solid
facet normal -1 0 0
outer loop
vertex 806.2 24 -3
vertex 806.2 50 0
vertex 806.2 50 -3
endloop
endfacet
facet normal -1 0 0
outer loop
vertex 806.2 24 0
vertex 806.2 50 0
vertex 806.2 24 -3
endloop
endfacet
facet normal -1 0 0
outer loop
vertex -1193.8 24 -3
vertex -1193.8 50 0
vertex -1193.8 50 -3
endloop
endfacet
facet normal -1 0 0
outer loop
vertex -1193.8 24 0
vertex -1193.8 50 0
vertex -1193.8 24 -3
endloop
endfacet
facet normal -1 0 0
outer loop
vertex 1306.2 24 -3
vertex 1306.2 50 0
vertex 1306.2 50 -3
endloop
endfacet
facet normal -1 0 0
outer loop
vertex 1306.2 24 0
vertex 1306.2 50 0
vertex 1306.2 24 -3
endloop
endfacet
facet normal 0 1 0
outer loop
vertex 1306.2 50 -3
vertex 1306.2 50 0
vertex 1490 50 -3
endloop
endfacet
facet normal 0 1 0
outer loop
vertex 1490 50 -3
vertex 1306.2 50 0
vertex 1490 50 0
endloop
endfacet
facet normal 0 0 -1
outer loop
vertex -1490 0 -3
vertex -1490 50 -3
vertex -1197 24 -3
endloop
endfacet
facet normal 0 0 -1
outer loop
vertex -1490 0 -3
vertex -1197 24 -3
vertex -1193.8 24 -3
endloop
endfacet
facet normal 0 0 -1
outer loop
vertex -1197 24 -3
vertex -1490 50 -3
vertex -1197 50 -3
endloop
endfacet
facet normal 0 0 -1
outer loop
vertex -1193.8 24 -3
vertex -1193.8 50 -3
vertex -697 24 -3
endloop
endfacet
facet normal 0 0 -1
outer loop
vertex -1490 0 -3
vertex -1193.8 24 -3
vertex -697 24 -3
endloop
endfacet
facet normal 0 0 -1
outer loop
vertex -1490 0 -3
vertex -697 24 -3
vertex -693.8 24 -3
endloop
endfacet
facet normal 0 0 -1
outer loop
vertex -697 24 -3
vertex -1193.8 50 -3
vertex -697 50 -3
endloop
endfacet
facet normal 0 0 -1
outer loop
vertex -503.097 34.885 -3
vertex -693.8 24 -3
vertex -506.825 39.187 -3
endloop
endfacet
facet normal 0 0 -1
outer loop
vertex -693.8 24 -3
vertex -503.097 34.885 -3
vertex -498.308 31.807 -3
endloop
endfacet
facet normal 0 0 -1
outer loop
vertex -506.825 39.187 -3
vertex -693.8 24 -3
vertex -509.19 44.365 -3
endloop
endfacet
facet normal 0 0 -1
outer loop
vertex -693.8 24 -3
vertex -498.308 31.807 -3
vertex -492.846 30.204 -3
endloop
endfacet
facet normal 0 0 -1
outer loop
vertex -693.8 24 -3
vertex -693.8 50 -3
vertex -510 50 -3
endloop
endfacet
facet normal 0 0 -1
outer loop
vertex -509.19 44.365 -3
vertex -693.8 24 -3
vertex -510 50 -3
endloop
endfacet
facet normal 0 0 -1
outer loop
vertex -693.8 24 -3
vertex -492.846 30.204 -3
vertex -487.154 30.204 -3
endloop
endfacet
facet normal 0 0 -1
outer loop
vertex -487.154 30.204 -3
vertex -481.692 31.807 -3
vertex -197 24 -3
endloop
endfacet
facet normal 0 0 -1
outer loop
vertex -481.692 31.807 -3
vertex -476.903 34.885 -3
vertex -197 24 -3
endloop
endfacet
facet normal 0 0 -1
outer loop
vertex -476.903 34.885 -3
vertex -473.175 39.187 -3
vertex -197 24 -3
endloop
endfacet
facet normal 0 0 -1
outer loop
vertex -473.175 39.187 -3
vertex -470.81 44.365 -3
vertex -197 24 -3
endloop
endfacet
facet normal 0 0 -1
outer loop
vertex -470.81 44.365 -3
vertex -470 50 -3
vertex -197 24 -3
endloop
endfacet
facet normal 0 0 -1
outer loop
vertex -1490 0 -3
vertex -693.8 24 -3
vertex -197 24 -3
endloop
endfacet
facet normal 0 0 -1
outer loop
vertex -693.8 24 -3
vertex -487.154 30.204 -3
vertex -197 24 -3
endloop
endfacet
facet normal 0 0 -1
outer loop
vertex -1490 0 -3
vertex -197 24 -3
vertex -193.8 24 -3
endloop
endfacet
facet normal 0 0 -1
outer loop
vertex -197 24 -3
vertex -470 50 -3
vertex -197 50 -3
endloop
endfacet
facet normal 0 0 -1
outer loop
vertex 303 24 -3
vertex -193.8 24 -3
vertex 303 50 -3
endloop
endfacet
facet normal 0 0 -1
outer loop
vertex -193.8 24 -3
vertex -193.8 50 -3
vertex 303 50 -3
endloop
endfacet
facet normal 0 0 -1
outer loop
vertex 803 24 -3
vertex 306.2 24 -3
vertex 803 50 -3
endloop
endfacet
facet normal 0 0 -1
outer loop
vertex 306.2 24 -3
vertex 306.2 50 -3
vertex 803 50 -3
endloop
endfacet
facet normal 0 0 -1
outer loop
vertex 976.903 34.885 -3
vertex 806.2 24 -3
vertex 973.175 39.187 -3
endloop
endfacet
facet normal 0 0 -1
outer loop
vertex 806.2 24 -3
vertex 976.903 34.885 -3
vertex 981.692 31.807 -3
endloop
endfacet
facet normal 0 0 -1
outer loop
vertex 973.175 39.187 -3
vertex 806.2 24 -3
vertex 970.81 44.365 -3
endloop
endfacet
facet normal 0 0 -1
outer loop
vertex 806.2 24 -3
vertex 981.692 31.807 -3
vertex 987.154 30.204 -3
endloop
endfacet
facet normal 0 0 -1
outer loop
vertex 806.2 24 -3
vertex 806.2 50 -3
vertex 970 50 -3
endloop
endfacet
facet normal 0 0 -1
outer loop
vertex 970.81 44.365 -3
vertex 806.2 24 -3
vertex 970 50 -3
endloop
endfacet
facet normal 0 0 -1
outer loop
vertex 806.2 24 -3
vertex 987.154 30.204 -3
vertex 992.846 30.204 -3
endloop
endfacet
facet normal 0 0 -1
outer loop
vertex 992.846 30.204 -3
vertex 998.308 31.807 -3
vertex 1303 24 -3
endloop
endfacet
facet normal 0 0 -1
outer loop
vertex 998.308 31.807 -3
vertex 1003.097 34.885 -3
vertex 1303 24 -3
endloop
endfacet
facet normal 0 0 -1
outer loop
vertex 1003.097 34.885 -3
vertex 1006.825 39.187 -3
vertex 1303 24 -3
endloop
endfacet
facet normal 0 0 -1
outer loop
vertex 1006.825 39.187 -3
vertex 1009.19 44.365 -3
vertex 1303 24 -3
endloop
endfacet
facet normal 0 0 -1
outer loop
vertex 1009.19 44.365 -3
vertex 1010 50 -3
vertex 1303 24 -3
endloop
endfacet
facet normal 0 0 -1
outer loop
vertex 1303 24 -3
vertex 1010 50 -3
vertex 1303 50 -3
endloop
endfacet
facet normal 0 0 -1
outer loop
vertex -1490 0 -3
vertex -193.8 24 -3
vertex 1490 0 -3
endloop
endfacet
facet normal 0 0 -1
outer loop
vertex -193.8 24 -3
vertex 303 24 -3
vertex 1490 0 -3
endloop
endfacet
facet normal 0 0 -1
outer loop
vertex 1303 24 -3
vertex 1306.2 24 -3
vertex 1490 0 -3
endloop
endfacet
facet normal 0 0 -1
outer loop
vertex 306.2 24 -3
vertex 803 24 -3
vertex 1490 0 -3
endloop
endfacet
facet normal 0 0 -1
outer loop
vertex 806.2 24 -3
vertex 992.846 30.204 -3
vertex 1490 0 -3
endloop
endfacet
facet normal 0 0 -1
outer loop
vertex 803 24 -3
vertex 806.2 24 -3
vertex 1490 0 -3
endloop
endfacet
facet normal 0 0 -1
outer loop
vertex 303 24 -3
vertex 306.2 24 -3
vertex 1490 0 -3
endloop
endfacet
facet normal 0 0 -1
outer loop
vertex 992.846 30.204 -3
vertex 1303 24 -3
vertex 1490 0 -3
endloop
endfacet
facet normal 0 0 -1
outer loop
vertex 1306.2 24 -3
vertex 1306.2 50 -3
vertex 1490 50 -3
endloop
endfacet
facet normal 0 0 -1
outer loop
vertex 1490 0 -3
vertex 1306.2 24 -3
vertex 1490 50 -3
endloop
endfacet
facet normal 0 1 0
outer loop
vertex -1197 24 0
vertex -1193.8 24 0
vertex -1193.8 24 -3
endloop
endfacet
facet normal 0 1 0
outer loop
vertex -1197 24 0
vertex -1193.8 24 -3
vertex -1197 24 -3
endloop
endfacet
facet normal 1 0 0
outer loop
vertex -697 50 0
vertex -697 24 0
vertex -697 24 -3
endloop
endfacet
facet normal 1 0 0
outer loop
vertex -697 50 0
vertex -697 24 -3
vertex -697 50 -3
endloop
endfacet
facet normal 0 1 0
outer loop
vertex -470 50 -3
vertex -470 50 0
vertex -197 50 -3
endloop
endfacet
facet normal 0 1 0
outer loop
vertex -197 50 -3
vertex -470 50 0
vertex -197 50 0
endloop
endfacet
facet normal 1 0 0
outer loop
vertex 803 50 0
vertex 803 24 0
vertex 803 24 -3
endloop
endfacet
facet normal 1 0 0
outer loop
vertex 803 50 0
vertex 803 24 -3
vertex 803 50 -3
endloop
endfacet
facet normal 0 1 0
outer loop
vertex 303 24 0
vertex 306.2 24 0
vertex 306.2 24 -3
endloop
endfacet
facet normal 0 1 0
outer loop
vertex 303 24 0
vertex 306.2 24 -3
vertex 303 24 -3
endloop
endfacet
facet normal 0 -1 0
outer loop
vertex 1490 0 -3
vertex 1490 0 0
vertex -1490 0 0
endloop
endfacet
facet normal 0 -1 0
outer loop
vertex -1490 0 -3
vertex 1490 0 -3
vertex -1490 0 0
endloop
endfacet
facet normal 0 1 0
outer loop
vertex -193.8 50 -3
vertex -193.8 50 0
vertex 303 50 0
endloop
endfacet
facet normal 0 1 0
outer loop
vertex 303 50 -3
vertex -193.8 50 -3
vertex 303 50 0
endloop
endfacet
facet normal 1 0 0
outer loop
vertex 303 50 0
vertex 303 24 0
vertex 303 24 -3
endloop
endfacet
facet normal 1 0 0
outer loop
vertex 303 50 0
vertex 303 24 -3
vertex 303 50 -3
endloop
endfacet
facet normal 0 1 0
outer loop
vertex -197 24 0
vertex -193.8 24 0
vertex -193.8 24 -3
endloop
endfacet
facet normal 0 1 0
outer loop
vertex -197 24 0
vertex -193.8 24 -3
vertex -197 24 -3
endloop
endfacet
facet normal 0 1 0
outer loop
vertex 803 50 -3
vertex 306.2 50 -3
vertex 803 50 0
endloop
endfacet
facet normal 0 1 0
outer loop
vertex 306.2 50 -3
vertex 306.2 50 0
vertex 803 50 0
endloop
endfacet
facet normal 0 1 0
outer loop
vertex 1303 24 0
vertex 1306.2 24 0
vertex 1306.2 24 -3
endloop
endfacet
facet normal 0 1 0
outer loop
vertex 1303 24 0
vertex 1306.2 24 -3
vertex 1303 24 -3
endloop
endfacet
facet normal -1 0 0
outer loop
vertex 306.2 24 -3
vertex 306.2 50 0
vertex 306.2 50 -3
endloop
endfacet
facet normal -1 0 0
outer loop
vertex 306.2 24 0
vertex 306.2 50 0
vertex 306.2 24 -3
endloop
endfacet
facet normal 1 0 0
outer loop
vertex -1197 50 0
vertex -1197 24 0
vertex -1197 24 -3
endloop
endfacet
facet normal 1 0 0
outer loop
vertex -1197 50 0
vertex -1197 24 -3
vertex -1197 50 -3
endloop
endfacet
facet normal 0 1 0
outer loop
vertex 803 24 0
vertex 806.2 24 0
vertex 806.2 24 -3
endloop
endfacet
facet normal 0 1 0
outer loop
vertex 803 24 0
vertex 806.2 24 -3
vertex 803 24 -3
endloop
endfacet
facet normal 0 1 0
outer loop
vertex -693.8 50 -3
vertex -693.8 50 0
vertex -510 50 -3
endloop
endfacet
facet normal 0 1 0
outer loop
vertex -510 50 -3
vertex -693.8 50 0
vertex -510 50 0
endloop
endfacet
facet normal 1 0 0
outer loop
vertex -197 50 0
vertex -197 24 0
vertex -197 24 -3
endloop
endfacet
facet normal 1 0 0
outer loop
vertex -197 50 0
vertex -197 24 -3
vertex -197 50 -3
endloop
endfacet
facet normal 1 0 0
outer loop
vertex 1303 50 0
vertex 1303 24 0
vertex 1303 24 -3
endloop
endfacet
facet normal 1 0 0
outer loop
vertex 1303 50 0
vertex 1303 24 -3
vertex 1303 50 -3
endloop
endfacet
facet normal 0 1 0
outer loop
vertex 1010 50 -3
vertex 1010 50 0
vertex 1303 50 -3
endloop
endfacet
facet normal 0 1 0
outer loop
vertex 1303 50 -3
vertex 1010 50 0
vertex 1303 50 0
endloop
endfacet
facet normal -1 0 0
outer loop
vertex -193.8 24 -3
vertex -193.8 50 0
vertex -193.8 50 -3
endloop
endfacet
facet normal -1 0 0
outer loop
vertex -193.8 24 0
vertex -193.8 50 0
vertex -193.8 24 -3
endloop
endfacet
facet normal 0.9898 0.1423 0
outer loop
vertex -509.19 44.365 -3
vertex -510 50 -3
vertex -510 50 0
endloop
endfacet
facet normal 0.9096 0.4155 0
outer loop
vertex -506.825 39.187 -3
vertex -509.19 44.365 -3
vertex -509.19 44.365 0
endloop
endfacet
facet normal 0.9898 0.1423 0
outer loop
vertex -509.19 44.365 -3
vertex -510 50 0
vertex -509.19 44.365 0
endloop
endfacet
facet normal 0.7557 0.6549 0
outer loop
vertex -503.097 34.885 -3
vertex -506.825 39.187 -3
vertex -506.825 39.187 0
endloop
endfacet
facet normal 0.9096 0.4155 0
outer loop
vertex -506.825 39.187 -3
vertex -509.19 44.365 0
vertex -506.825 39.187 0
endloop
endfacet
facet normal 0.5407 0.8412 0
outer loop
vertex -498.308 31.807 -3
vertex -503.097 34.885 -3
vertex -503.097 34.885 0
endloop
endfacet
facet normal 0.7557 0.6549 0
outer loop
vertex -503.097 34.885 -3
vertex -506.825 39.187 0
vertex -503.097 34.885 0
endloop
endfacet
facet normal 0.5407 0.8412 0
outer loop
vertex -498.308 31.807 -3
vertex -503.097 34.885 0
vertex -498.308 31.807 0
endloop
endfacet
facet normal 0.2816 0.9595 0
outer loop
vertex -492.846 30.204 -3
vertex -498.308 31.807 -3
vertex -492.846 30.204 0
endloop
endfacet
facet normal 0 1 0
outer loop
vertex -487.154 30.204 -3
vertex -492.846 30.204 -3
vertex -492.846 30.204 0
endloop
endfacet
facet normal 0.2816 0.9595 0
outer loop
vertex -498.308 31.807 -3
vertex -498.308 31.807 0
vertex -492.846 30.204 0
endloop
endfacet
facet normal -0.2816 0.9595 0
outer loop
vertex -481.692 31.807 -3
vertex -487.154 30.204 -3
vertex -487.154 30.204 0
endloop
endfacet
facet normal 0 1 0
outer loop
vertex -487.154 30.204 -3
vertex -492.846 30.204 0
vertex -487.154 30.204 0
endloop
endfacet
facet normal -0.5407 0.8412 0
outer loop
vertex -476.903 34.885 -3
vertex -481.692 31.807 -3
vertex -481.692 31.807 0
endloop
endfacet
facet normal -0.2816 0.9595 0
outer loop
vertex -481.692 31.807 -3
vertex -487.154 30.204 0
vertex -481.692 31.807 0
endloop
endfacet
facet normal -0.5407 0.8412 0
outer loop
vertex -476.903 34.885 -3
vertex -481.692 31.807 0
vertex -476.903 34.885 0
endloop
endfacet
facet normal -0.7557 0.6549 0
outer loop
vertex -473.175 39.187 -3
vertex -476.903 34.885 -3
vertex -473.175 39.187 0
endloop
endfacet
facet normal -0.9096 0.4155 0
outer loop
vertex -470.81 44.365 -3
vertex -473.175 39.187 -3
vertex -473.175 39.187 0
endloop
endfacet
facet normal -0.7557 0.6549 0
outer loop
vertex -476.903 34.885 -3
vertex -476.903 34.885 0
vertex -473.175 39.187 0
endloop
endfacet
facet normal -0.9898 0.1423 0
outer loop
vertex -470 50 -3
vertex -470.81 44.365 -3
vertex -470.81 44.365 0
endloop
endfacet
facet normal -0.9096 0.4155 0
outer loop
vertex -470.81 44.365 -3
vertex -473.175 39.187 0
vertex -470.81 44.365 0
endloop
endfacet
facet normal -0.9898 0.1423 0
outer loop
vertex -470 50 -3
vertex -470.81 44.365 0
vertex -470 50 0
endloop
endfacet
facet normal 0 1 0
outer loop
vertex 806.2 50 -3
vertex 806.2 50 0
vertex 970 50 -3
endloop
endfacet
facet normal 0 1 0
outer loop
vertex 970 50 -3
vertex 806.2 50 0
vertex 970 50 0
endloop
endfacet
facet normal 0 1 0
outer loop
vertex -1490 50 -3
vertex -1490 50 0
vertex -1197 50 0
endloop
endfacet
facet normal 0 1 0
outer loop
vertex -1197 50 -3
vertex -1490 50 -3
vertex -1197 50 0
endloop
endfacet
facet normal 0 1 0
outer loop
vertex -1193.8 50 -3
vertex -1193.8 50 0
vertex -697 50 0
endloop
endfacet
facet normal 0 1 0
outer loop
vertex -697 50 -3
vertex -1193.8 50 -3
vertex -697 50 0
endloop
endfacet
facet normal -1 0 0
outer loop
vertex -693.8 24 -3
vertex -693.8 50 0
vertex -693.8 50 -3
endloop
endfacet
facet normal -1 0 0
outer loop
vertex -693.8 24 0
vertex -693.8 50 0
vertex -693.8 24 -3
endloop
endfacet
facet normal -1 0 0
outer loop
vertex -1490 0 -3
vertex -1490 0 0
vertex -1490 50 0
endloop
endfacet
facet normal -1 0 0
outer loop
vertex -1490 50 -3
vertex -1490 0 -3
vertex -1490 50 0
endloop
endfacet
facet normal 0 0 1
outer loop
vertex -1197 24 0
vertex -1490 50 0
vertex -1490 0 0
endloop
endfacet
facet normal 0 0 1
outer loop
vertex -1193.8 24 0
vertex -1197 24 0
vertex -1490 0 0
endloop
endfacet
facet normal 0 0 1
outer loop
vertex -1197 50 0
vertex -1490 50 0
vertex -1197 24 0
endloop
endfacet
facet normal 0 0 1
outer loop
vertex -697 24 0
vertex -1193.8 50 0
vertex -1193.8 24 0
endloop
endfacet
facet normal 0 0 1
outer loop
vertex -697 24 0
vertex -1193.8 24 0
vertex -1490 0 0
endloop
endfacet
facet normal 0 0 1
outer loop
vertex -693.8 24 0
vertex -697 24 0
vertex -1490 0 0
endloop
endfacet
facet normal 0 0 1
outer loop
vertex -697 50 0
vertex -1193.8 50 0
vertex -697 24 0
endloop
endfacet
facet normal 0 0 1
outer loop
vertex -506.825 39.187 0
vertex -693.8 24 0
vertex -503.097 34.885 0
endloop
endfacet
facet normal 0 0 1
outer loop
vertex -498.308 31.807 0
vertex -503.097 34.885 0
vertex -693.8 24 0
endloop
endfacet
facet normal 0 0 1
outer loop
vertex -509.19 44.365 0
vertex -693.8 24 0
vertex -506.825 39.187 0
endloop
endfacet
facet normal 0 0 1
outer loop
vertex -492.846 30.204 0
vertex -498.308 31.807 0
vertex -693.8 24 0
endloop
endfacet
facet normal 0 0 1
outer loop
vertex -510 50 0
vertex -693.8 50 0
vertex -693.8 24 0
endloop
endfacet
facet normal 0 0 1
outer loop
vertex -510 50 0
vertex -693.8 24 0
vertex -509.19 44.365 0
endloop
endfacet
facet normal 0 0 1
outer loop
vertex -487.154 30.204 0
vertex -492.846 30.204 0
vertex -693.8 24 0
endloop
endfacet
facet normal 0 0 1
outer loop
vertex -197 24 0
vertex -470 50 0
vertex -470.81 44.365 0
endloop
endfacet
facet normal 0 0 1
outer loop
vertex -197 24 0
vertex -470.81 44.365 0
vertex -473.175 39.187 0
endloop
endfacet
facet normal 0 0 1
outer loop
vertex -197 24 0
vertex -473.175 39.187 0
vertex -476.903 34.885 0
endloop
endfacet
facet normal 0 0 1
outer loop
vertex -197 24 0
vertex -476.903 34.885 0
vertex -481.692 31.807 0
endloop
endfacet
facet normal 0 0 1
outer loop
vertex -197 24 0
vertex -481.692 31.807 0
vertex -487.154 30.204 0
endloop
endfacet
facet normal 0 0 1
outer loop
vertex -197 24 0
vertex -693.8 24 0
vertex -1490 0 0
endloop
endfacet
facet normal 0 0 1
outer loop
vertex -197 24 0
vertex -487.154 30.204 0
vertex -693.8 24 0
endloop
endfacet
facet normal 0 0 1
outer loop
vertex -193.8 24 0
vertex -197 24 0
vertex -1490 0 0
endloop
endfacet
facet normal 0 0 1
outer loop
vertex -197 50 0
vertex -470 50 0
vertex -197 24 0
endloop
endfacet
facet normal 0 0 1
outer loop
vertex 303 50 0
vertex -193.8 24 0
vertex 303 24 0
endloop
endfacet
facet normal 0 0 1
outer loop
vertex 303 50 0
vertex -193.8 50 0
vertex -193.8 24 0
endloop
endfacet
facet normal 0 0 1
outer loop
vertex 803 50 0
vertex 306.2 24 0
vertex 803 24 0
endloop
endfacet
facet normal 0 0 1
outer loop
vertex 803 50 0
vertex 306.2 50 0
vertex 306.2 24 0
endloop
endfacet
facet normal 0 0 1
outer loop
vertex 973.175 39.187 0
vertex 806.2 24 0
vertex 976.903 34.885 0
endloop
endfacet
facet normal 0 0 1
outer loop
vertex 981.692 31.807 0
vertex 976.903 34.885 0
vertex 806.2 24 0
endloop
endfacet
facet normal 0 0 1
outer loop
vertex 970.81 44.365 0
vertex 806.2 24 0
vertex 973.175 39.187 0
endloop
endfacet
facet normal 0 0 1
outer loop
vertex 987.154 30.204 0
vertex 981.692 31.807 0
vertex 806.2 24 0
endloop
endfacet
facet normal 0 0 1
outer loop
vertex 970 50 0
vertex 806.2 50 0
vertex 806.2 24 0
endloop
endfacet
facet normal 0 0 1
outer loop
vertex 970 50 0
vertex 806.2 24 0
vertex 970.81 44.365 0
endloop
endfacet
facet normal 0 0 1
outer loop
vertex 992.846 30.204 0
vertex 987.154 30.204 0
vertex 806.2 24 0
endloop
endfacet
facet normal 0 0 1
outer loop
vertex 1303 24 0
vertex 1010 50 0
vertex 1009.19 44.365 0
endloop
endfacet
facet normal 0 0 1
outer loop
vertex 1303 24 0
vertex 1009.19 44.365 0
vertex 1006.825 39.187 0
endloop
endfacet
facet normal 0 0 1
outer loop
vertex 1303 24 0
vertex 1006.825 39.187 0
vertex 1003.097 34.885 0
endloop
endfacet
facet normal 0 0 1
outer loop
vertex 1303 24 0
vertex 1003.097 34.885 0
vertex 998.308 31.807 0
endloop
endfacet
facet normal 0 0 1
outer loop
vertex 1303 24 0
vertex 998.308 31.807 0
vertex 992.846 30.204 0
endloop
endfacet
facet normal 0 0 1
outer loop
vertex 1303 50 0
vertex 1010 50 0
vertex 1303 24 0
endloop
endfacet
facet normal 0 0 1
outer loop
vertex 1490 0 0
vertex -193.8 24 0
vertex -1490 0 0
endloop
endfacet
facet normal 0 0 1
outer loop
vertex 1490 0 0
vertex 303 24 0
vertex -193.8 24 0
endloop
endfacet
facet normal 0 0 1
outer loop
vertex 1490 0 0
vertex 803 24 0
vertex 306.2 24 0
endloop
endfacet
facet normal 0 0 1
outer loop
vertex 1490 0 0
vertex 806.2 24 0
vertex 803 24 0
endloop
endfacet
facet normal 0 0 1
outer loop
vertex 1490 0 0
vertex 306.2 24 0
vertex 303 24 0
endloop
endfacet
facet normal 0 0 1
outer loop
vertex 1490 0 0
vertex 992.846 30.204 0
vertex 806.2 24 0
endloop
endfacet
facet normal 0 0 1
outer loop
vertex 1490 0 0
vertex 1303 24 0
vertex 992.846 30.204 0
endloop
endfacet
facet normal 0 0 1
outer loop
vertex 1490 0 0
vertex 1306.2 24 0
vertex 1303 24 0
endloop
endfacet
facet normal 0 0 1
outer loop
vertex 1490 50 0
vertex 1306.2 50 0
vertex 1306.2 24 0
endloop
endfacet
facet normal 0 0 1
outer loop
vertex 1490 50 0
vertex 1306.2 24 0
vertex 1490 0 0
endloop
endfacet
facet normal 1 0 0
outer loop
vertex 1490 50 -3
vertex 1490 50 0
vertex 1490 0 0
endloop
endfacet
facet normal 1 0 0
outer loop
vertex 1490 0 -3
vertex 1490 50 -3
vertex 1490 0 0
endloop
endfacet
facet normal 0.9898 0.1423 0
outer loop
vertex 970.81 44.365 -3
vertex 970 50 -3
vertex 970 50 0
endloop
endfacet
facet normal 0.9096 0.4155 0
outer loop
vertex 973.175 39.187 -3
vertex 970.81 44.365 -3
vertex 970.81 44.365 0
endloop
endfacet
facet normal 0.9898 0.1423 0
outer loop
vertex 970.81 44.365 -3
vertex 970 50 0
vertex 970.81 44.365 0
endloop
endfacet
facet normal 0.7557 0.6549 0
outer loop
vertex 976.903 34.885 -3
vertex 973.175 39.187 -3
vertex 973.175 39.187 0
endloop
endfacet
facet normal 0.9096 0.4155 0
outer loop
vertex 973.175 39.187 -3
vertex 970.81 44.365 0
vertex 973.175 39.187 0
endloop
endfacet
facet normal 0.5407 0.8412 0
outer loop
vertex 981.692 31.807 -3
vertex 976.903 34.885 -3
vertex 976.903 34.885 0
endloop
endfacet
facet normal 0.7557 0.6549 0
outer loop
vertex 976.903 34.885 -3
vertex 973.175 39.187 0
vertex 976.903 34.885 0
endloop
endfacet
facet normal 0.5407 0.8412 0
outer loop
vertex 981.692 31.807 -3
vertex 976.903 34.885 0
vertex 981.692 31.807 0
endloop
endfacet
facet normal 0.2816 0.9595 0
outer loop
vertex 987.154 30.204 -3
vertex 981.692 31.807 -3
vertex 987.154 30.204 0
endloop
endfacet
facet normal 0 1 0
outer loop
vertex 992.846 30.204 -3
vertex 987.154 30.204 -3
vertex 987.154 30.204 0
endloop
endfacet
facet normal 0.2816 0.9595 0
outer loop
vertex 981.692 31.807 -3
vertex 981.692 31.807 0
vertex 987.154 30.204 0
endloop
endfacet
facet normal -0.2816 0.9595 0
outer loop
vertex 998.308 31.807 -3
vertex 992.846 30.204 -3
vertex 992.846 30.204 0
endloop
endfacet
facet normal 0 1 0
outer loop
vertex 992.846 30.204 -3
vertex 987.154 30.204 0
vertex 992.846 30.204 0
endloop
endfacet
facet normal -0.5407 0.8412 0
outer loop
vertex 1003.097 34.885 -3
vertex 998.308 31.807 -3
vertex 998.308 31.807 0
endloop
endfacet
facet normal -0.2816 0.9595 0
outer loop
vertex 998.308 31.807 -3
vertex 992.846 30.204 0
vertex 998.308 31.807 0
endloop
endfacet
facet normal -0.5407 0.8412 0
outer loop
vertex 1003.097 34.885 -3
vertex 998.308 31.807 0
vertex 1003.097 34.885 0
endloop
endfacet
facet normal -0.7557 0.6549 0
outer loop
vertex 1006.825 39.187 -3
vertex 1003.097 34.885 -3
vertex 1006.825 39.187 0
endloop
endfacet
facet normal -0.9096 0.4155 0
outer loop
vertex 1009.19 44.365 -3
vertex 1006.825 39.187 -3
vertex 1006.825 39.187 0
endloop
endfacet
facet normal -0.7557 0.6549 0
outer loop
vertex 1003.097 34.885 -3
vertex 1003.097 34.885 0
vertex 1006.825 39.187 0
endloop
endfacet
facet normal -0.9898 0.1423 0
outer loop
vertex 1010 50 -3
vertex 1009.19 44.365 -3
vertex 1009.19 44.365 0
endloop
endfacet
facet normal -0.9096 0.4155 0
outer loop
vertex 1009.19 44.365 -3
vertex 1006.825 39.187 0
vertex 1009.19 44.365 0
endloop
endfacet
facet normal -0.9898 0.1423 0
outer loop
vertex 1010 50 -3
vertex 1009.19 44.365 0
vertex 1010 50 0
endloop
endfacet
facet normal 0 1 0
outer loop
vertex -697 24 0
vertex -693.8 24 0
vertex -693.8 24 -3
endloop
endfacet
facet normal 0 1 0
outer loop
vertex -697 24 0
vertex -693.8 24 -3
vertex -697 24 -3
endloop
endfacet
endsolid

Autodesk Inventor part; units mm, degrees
ref_plane "YZ Plane" through (0, 0, 0) normal (1, 0, 0) x (0, 1, 0)
ref_plane "XZ Plane" through (0, 0, 0) normal (0, 1, 0) x (-1, 0, 0)
ref_plane "XY Plane" through (0, 0, 0) normal (0, 0, 1) x (1, 0, 0)
sketch "Sketch8" plane through (0, 0, 0) normal (0, 0, 1) x (1, 0, 0)
  line L0 (-1490, 50) -> (1490, 50)
  line L1 (1490, 50) -> (1490, 0)
  line L2 (1490, 0) -> (-1490, 0)
  line L3 (-1490, 0) -> (-1490, 50)
  point P0 (0, 0)
  point P1 (0, 0)
  dimension "d37" = 50
  dimension "d38" = 2980
extrude "Plate5" add sketch "Sketch8" against normal blind 3
sketch "Sketch9" plane through (0, 0, 0) normal (0, 0, 1) x (1, 0, 0)
  line L0 (1490, 50) -> (-1490, 50) projected
  line L1 (-1197, 50) -> (-1193.8, 50)
  line L2 (-1193.8, 50) -> (-1193.8, 24)
  line L3 (-1193.8, 24) -> (-1197, 24)
  line L4 (-1197, 24) -> (-1197, 50)
  line L5 (-1490, 50) -> (-1490, 0) projected
  point P0 (0, 0)
  point P1 (-1193.8, 50)
  dimension "d42" = 293
  dimension "d43" = 3.2
  dimension "d44" = 26
extrude "Extrusion3" cut sketch "Sketch9" against normal through all
pattern_linear "Rectangular Pattern2" count 6 spacing 500 along (1, 0, 0) of "Extrusion3"
sketch "Sketch10" plane through (0, 0, 0) normal (0, 0, 1) x (1, 0, 0)
  line L0 (1303, 24) -> (1303, 50) projected
  line L1 (1303, 50) -> (806.2, 50) projected
  line L2 (806.2, 50) -> (806.2, 24) projected
  line L3 (806.2, 24) -> (803, 24) projected
  line L4 (803, 24) -> (803, 50) projected
  line L5 (803, 50) -> (306.2, 50) projected
  line L6 (306.2, 50) -> (306.2, 24) projected
  line L7 (306.2, 24) -> (303, 24) projected
  line L8 (303, 24) -> (303, 50) projected
  line L9 (303, 50) -> (-193.8, 50) projected
  line L10 (-193.8, 50) -> (-193.8, 24) projected
  line L11 (-193.8, 24) -> (-197, 24) projected
  line L12 (-197, 24) -> (-197, 50) projected
  line L13 (-197, 50) -> (-693.8, 50) projected
  line L14 (-693.8, 50) -> (-693.8, 24) projected
  line L15 (-693.8, 24) -> (-697, 24) projected
  line L16 (-697, 24) -> (-697, 50) projected
  line L17 (-697, 50) -> (-1193.8, 50) projected
  line L18 (-1193.8, 50) -> (-1193.8, 24) projected
  line L19 (-1193.8, 24) -> (-1197, 24) projected
  line L20 (-1197, 24) -> (-1197, 50) projected
  line L21 (-1197, 50) -> (-1490, 50) projected
  line L22 (-1490, 50) -> (-1490, 0) projected
  line L23 (-1490, 0) -> (1490, 0) projected
  line L24 (1490, 0) -> (1490, 50) projected
  line L25 (1490, 50) -> (1306.2, 50) projected
  line L26 (1306.2, 50) -> (1306.2, 24) projected
  line L27 (1306.2, 24) -> (1303, 24) projected
  circle A0 centre (-490, 50) radius 20
  circle A1 centre (990, 50) radius 20
  point P0 (0, 0)
  point P1 (1340, 50)
  point P2 (1380, 50)
  point P3 (-140, 50)
  point P4 (-100, 50)
  point P5 (970, 50)
  point P6 (1010, 50)
  point P7 (-510, 50)
  point P8 (-470, 50)
  dimension "d50" = 40
  dimension "d51" = 1480
  dimension "d52" = 1000
extrude "Extrusion4" cut sketch "Sketch10" against normal through all contours A1 L1 | L1 A1 | A0 L13 | L13 A0
sketch "Sketch11" plane through (0, 0, 0) normal (0, 0, 1) x (1, 0, 0)
  line L0 (-1473.7105, 19.3646) -> (-1242.1993, 19.3646) construction
  line L1 (-1242.1993, 19.3646) -> (-1242.1993, 3.0803) construction
  line L2 (-1242.1993, 3.0803) -> (-1473.7105, 3.0803) construction
  line L3 (-1473.7105, 3.0803) -> (-1473.7105, 19.3646) construction
  point P0 (0, 0)
mark "Mark1"
equation "\"d41\" = Thickness"
equation "\"BendReliefWidth\" = Thickness"
equation "\"BendReliefDepth\" = 0.5 * Thickness"
equation "\"CornerReliefSize\" = 4 * Thickness"
equation "\"MinimumRemnant\" = 2 * Thickness"
equation "\"TransitionRadius\" = BendRadius"
equation "\"JacobiRadiusSize\" = BendRadius"
equation "\"GapSize\" = Thickness"
equation "\"Thickness\" = 3"
equation "\"BendRadius\" = 5"
properties part number "BSH 032 stringer floor 2" material "09g2s"
